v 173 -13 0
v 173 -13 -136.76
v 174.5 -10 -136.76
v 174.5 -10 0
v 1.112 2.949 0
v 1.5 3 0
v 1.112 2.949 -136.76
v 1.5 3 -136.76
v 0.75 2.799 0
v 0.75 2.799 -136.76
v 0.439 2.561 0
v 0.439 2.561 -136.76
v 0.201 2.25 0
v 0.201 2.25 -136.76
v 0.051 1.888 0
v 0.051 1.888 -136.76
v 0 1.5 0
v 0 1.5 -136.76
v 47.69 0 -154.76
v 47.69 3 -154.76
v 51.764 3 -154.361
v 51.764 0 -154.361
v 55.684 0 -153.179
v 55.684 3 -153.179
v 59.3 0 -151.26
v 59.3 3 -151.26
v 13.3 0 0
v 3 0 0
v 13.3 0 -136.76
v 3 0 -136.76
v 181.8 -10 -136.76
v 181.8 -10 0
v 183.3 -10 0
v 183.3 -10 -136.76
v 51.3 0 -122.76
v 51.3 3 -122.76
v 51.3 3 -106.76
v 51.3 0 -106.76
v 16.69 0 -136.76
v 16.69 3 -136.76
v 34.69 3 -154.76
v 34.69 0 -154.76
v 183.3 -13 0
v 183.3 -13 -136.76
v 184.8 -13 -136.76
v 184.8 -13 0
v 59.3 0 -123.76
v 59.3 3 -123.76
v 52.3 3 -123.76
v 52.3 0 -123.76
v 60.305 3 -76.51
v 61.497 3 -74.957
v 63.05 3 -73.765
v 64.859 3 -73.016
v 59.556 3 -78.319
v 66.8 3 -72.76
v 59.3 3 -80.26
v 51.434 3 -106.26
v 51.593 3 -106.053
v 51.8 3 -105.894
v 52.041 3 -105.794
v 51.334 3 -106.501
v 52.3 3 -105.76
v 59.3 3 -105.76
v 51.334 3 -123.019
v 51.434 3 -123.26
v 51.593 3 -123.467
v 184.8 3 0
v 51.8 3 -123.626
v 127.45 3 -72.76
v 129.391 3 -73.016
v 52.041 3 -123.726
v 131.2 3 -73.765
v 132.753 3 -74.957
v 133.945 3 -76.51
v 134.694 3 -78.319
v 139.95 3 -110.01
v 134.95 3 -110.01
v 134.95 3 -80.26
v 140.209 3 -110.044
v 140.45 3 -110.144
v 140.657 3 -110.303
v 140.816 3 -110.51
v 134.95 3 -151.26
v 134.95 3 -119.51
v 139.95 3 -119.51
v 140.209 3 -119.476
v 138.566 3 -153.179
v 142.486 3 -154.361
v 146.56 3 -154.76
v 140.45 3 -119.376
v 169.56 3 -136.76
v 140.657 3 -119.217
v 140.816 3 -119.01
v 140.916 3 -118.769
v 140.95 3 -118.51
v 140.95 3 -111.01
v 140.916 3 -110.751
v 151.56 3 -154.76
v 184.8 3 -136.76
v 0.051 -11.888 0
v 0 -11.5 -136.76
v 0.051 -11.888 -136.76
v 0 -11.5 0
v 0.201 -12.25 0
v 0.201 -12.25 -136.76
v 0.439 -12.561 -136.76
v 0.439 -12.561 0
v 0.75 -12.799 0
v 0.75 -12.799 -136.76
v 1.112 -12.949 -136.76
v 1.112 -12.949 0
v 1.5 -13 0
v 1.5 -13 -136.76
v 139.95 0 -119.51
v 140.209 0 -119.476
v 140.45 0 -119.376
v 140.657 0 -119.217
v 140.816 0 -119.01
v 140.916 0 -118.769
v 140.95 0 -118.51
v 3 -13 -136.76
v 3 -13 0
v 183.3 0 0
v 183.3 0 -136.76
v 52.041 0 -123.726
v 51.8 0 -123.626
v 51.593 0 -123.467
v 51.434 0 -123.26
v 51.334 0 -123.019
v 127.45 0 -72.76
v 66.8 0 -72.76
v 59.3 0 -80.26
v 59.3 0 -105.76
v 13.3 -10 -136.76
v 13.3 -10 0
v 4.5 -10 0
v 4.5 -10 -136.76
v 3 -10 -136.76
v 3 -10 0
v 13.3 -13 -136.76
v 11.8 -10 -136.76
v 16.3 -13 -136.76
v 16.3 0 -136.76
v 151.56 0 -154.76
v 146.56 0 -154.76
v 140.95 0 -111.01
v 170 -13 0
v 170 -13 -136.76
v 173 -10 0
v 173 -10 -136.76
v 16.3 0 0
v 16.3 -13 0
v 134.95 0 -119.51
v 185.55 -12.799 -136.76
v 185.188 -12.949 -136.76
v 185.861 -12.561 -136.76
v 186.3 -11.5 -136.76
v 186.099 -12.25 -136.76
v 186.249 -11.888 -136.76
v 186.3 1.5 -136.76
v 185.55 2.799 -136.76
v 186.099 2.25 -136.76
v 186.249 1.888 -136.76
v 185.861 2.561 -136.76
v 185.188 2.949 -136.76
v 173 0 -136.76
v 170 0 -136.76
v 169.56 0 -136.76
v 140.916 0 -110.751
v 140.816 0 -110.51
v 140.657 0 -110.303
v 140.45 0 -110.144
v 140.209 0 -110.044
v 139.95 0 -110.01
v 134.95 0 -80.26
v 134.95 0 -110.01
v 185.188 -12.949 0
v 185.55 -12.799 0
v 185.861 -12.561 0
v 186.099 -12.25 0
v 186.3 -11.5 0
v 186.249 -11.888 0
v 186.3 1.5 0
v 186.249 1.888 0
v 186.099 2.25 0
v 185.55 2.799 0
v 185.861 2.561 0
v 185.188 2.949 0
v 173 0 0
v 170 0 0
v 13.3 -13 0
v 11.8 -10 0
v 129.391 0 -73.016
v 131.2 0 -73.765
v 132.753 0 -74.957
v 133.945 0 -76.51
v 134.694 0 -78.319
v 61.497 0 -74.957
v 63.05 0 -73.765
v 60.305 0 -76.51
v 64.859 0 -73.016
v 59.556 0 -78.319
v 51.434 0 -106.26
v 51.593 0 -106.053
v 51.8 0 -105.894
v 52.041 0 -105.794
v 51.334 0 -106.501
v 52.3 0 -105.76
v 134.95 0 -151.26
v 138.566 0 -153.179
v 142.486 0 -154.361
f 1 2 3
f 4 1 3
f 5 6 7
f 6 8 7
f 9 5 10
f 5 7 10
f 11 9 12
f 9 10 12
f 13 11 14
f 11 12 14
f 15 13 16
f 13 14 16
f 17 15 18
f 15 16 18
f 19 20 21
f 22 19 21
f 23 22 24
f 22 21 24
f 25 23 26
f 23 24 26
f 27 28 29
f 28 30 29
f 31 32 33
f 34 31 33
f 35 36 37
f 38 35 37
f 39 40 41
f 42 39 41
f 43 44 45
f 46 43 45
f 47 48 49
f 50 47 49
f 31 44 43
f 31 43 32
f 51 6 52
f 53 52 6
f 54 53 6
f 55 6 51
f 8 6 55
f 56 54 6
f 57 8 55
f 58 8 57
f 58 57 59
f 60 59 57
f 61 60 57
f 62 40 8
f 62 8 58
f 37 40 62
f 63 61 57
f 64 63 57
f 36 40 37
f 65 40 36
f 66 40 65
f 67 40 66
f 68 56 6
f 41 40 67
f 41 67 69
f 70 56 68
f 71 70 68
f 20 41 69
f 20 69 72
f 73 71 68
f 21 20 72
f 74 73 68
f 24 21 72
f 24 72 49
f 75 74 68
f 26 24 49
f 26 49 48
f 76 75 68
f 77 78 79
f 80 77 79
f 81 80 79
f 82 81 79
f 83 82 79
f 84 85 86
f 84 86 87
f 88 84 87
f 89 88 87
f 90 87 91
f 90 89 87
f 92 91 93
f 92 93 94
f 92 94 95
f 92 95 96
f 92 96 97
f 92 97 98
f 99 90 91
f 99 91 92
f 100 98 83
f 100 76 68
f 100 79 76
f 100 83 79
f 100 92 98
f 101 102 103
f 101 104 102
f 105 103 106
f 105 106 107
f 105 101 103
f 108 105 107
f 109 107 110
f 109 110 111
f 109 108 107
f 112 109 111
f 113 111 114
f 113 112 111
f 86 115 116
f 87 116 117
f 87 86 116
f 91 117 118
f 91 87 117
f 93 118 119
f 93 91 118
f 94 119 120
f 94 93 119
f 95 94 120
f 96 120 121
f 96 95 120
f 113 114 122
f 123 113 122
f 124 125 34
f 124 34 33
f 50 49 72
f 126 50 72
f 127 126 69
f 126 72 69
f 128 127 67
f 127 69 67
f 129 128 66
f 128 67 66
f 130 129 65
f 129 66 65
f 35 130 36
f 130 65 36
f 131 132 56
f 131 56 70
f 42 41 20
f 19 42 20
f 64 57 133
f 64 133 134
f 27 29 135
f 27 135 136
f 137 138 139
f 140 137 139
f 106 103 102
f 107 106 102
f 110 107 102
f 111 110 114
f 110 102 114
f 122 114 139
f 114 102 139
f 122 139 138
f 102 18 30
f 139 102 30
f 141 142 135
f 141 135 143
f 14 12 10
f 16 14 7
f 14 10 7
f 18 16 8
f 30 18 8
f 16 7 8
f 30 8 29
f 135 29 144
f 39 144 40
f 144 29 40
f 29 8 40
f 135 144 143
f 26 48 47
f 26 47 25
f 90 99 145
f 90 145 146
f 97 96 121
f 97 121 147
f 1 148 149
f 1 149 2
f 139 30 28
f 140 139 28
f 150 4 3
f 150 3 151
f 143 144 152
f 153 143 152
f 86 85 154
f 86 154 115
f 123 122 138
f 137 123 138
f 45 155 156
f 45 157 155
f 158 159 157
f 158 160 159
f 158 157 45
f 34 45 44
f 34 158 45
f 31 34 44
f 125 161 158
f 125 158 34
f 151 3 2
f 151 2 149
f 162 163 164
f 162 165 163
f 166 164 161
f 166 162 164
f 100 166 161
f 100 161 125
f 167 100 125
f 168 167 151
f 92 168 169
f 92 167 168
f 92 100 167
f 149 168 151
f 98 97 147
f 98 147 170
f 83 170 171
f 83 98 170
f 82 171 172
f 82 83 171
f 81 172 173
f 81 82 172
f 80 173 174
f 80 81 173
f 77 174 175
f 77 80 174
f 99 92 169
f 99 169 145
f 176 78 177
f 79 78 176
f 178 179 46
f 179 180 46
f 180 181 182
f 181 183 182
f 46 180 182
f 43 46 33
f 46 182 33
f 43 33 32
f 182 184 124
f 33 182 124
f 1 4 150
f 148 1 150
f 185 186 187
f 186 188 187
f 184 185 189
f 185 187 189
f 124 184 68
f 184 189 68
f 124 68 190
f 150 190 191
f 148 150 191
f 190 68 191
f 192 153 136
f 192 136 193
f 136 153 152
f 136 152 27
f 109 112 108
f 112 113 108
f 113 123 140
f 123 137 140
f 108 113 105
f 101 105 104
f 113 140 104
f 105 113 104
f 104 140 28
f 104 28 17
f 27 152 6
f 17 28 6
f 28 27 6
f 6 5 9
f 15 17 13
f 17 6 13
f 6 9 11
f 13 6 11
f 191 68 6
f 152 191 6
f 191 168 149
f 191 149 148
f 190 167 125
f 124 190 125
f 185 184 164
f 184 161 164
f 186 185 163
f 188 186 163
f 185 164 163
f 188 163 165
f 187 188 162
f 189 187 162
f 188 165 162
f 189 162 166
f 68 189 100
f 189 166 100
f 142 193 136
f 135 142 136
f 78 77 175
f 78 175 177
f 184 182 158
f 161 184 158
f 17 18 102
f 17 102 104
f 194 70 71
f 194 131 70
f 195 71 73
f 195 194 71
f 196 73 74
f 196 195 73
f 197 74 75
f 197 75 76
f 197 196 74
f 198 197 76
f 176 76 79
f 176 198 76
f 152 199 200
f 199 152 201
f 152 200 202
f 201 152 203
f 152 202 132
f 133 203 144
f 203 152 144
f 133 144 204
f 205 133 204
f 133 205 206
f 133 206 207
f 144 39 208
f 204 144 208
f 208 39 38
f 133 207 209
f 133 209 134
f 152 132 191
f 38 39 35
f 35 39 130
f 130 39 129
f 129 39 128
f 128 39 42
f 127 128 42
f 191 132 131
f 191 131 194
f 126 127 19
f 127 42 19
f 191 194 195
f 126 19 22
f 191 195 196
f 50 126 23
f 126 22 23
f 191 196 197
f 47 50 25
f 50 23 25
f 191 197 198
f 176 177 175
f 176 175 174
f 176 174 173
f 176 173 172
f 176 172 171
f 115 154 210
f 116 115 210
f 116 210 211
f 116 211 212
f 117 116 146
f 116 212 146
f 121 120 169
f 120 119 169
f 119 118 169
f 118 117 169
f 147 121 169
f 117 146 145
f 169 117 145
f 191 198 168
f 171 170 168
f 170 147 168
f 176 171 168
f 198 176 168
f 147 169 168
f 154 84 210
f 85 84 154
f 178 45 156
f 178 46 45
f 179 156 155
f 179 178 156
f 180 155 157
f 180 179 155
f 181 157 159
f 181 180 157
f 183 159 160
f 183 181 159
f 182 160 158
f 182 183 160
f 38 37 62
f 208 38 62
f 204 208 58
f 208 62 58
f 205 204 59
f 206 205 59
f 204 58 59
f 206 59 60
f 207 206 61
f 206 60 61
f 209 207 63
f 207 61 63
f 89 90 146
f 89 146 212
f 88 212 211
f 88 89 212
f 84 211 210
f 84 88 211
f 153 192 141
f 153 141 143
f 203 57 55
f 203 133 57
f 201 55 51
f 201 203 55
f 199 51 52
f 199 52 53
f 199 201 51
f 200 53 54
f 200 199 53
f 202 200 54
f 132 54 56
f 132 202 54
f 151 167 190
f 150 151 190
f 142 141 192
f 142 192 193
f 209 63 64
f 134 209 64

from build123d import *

# Parameters (mm, degrees)
SKETCH1_W           = 186.3
SKETCH1_H           = 72.76
BOSS_EXTRUDE1_DEPTH = 3
SKETCH3_W           = 59.3
SKETCH3_H           = 64
SKETCH3_W_2         = 51.35
BOSS_EXTRUDE3_DEPTH = 3
BOSS_EXTRUDE4_DEPTH = 3
CUT_EXTRUDE1_DEPTH  = 10
SKETCH9_W           = 3
SKETCH9_H           = 136.76
BOSS_EXTRUDE7_DEPTH = 13
FILLET1_R           = 7.5
BOSS_EXTRUDE8_DEPTH = 136.76
FILLET2_R           = 1.5


with BuildPart() as part:
    # Sketch1 → Boss-Extrude1 (new body)
    with BuildSketch(Plane(origin=(0, 0, 0), x_dir=(1, 0, 0), z_dir=(0, 1, 0))):
        with Locations((93.15, 36.38)):
            Rectangle(SKETCH1_W, SKETCH1_H)
    extrude(amount=BOSS_EXTRUDE1_DEPTH)

    # Sketch3 → Boss-Extrude3 (add)
    with BuildSketch(Plane(origin=(0, 3, 0), x_dir=(1, 0, 0), z_dir=(0, 1, 0))):
        with Locations((29.65, 104.76)):
            Rectangle(SKETCH3_W, SKETCH3_H)
        with Locations((160.625, 104.76)):
            Rectangle(SKETCH3_W_2, SKETCH3_H)
    extrude(amount=-BOSS_EXTRUDE3_DEPTH)

    # Sketch5 → Boss-Extrude4 (add)
    with BuildSketch(Plane(origin=(0, 3, 0), x_dir=(1, 0, 0), z_dir=(0, 1, 0))):
        with BuildLine():
            Line((169.56, 136.76), (151.56, 154.76))
            Line((151.56, 154.76), (146.56, 154.76))
            ThreePointArc((146.56, 154.76), (140.496954148, 153.865974954), (134.95, 151.26))
            Line((134.95, 151.26), (134.95, 136.76))
            Line((134.95, 136.76), (169.56, 136.76))
        make_face()
        with BuildLine():
            Line((59.3, 136.76), (16.69, 136.76))
            Line((16.69, 136.76), (34.69, 154.76))
            Line((34.69, 154.76), (47.69, 154.76))
            ThreePointArc((47.69, 154.76), (53.753045852, 153.865974954), (59.3, 151.26))
            Line((59.3, 151.26), (59.3, 136.76))
        make_face()
    extrude(amount=-BOSS_EXTRUDE4_DEPTH)

    # Sketch6 → Cut-Extrude1 (cut)
    with BuildSketch(Plane(origin=(0, 3, 0), x_dir=(1, 0, 0), z_dir=(0, 1, 0))):
        with BuildLine():
            Line((59.3, 123.76), (52.3, 123.76))
            ThreePointArc((52.3, 123.76), (51.592893219, 123.467106781), (51.3, 122.76))
            Line((51.3, 122.76), (51.3, 106.76))
            ThreePointArc((51.3, 106.76), (51.592893219, 106.052893219), (52.3, 105.76))
            Line((52.3, 105.76), (59.3, 105.76))
            Line((59.3, 105.76), (59.3, 123.76))
        make_face()
        with BuildLine():
            Line((139.95, 110.01), (134.95, 110.01))
            Line((134.95, 110.01), (134.95, 119.51))
            Line((134.95, 119.51), (139.95, 119.51))
            ThreePointArc((139.95, 119.51), (140.657106781, 119.217106781), (140.95, 118.51))
            Line((140.95, 118.51), (140.95, 111.01))
            ThreePointArc((140.95, 111.01), (140.657106781, 110.302893219), (139.95, 110.01))
        make_face()
    extrude(amount=-CUT_EXTRUDE1_DEPTH, mode=Mode.SUBTRACT)

    # Sketch9 → Boss-Extrude7 (add)
    with BuildSketch(Plane.XZ):
        with Locations((1.5, -68.38)):
            Rectangle(SKETCH9_W, SKETCH9_H)
        with Locations((184.8, -68.38)):
            Rectangle(SKETCH9_W, SKETCH9_H)
        with Locations((14.8, -68.38)):
            Rectangle(SKETCH9_W, SKETCH9_H)
        with Locations((171.5, -68.38)):
            Rectangle(SKETCH9_W, SKETCH9_H)
    extrude(amount=BOSS_EXTRUDE7_DEPTH)

    # Fillet1
    fillet1_edges = [part.edges().sort_by_distance(p)[0] for p in [
        (59.3, 1.5, -72.76),
        (134.95, 1.5, -72.76),
    ]]
    fillet(fillet1_edges, radius=FILLET1_R)

    # Sketch10 → Boss-Extrude8 (add)
    with BuildSketch(Plane(origin=(0, 0, -136.76), x_dir=(-1, 0, 0), z_dir=(0, 0, -1))):
        Polygon((-183.3, -13), (-181.8, -10), (-183.3, -10), align=None)
        Polygon((-174.5, -10), (-173, -10), (-173, -13), align=None)
        Polygon((-13.3, -10), (-13.3, -13), (-11.8, -10), align=None)
        Polygon((-4.5, -10), (-3, -10), (-3, -13), align=None)
    extrude(amount=-BOSS_EXTRUDE8_DEPTH)

    # Fillet2
    fillet2_edges = [part.edges().sort_by_distance(p)[0] for p in [
        (186.3, 3, -68.38),
        (0, -13, -68.38),
        (186.3, -13, -68.38),
        (0, 3, -68.38),
    ]]
    fillet(fillet2_edges, radius=FILLET2_R)


solid = part.part
